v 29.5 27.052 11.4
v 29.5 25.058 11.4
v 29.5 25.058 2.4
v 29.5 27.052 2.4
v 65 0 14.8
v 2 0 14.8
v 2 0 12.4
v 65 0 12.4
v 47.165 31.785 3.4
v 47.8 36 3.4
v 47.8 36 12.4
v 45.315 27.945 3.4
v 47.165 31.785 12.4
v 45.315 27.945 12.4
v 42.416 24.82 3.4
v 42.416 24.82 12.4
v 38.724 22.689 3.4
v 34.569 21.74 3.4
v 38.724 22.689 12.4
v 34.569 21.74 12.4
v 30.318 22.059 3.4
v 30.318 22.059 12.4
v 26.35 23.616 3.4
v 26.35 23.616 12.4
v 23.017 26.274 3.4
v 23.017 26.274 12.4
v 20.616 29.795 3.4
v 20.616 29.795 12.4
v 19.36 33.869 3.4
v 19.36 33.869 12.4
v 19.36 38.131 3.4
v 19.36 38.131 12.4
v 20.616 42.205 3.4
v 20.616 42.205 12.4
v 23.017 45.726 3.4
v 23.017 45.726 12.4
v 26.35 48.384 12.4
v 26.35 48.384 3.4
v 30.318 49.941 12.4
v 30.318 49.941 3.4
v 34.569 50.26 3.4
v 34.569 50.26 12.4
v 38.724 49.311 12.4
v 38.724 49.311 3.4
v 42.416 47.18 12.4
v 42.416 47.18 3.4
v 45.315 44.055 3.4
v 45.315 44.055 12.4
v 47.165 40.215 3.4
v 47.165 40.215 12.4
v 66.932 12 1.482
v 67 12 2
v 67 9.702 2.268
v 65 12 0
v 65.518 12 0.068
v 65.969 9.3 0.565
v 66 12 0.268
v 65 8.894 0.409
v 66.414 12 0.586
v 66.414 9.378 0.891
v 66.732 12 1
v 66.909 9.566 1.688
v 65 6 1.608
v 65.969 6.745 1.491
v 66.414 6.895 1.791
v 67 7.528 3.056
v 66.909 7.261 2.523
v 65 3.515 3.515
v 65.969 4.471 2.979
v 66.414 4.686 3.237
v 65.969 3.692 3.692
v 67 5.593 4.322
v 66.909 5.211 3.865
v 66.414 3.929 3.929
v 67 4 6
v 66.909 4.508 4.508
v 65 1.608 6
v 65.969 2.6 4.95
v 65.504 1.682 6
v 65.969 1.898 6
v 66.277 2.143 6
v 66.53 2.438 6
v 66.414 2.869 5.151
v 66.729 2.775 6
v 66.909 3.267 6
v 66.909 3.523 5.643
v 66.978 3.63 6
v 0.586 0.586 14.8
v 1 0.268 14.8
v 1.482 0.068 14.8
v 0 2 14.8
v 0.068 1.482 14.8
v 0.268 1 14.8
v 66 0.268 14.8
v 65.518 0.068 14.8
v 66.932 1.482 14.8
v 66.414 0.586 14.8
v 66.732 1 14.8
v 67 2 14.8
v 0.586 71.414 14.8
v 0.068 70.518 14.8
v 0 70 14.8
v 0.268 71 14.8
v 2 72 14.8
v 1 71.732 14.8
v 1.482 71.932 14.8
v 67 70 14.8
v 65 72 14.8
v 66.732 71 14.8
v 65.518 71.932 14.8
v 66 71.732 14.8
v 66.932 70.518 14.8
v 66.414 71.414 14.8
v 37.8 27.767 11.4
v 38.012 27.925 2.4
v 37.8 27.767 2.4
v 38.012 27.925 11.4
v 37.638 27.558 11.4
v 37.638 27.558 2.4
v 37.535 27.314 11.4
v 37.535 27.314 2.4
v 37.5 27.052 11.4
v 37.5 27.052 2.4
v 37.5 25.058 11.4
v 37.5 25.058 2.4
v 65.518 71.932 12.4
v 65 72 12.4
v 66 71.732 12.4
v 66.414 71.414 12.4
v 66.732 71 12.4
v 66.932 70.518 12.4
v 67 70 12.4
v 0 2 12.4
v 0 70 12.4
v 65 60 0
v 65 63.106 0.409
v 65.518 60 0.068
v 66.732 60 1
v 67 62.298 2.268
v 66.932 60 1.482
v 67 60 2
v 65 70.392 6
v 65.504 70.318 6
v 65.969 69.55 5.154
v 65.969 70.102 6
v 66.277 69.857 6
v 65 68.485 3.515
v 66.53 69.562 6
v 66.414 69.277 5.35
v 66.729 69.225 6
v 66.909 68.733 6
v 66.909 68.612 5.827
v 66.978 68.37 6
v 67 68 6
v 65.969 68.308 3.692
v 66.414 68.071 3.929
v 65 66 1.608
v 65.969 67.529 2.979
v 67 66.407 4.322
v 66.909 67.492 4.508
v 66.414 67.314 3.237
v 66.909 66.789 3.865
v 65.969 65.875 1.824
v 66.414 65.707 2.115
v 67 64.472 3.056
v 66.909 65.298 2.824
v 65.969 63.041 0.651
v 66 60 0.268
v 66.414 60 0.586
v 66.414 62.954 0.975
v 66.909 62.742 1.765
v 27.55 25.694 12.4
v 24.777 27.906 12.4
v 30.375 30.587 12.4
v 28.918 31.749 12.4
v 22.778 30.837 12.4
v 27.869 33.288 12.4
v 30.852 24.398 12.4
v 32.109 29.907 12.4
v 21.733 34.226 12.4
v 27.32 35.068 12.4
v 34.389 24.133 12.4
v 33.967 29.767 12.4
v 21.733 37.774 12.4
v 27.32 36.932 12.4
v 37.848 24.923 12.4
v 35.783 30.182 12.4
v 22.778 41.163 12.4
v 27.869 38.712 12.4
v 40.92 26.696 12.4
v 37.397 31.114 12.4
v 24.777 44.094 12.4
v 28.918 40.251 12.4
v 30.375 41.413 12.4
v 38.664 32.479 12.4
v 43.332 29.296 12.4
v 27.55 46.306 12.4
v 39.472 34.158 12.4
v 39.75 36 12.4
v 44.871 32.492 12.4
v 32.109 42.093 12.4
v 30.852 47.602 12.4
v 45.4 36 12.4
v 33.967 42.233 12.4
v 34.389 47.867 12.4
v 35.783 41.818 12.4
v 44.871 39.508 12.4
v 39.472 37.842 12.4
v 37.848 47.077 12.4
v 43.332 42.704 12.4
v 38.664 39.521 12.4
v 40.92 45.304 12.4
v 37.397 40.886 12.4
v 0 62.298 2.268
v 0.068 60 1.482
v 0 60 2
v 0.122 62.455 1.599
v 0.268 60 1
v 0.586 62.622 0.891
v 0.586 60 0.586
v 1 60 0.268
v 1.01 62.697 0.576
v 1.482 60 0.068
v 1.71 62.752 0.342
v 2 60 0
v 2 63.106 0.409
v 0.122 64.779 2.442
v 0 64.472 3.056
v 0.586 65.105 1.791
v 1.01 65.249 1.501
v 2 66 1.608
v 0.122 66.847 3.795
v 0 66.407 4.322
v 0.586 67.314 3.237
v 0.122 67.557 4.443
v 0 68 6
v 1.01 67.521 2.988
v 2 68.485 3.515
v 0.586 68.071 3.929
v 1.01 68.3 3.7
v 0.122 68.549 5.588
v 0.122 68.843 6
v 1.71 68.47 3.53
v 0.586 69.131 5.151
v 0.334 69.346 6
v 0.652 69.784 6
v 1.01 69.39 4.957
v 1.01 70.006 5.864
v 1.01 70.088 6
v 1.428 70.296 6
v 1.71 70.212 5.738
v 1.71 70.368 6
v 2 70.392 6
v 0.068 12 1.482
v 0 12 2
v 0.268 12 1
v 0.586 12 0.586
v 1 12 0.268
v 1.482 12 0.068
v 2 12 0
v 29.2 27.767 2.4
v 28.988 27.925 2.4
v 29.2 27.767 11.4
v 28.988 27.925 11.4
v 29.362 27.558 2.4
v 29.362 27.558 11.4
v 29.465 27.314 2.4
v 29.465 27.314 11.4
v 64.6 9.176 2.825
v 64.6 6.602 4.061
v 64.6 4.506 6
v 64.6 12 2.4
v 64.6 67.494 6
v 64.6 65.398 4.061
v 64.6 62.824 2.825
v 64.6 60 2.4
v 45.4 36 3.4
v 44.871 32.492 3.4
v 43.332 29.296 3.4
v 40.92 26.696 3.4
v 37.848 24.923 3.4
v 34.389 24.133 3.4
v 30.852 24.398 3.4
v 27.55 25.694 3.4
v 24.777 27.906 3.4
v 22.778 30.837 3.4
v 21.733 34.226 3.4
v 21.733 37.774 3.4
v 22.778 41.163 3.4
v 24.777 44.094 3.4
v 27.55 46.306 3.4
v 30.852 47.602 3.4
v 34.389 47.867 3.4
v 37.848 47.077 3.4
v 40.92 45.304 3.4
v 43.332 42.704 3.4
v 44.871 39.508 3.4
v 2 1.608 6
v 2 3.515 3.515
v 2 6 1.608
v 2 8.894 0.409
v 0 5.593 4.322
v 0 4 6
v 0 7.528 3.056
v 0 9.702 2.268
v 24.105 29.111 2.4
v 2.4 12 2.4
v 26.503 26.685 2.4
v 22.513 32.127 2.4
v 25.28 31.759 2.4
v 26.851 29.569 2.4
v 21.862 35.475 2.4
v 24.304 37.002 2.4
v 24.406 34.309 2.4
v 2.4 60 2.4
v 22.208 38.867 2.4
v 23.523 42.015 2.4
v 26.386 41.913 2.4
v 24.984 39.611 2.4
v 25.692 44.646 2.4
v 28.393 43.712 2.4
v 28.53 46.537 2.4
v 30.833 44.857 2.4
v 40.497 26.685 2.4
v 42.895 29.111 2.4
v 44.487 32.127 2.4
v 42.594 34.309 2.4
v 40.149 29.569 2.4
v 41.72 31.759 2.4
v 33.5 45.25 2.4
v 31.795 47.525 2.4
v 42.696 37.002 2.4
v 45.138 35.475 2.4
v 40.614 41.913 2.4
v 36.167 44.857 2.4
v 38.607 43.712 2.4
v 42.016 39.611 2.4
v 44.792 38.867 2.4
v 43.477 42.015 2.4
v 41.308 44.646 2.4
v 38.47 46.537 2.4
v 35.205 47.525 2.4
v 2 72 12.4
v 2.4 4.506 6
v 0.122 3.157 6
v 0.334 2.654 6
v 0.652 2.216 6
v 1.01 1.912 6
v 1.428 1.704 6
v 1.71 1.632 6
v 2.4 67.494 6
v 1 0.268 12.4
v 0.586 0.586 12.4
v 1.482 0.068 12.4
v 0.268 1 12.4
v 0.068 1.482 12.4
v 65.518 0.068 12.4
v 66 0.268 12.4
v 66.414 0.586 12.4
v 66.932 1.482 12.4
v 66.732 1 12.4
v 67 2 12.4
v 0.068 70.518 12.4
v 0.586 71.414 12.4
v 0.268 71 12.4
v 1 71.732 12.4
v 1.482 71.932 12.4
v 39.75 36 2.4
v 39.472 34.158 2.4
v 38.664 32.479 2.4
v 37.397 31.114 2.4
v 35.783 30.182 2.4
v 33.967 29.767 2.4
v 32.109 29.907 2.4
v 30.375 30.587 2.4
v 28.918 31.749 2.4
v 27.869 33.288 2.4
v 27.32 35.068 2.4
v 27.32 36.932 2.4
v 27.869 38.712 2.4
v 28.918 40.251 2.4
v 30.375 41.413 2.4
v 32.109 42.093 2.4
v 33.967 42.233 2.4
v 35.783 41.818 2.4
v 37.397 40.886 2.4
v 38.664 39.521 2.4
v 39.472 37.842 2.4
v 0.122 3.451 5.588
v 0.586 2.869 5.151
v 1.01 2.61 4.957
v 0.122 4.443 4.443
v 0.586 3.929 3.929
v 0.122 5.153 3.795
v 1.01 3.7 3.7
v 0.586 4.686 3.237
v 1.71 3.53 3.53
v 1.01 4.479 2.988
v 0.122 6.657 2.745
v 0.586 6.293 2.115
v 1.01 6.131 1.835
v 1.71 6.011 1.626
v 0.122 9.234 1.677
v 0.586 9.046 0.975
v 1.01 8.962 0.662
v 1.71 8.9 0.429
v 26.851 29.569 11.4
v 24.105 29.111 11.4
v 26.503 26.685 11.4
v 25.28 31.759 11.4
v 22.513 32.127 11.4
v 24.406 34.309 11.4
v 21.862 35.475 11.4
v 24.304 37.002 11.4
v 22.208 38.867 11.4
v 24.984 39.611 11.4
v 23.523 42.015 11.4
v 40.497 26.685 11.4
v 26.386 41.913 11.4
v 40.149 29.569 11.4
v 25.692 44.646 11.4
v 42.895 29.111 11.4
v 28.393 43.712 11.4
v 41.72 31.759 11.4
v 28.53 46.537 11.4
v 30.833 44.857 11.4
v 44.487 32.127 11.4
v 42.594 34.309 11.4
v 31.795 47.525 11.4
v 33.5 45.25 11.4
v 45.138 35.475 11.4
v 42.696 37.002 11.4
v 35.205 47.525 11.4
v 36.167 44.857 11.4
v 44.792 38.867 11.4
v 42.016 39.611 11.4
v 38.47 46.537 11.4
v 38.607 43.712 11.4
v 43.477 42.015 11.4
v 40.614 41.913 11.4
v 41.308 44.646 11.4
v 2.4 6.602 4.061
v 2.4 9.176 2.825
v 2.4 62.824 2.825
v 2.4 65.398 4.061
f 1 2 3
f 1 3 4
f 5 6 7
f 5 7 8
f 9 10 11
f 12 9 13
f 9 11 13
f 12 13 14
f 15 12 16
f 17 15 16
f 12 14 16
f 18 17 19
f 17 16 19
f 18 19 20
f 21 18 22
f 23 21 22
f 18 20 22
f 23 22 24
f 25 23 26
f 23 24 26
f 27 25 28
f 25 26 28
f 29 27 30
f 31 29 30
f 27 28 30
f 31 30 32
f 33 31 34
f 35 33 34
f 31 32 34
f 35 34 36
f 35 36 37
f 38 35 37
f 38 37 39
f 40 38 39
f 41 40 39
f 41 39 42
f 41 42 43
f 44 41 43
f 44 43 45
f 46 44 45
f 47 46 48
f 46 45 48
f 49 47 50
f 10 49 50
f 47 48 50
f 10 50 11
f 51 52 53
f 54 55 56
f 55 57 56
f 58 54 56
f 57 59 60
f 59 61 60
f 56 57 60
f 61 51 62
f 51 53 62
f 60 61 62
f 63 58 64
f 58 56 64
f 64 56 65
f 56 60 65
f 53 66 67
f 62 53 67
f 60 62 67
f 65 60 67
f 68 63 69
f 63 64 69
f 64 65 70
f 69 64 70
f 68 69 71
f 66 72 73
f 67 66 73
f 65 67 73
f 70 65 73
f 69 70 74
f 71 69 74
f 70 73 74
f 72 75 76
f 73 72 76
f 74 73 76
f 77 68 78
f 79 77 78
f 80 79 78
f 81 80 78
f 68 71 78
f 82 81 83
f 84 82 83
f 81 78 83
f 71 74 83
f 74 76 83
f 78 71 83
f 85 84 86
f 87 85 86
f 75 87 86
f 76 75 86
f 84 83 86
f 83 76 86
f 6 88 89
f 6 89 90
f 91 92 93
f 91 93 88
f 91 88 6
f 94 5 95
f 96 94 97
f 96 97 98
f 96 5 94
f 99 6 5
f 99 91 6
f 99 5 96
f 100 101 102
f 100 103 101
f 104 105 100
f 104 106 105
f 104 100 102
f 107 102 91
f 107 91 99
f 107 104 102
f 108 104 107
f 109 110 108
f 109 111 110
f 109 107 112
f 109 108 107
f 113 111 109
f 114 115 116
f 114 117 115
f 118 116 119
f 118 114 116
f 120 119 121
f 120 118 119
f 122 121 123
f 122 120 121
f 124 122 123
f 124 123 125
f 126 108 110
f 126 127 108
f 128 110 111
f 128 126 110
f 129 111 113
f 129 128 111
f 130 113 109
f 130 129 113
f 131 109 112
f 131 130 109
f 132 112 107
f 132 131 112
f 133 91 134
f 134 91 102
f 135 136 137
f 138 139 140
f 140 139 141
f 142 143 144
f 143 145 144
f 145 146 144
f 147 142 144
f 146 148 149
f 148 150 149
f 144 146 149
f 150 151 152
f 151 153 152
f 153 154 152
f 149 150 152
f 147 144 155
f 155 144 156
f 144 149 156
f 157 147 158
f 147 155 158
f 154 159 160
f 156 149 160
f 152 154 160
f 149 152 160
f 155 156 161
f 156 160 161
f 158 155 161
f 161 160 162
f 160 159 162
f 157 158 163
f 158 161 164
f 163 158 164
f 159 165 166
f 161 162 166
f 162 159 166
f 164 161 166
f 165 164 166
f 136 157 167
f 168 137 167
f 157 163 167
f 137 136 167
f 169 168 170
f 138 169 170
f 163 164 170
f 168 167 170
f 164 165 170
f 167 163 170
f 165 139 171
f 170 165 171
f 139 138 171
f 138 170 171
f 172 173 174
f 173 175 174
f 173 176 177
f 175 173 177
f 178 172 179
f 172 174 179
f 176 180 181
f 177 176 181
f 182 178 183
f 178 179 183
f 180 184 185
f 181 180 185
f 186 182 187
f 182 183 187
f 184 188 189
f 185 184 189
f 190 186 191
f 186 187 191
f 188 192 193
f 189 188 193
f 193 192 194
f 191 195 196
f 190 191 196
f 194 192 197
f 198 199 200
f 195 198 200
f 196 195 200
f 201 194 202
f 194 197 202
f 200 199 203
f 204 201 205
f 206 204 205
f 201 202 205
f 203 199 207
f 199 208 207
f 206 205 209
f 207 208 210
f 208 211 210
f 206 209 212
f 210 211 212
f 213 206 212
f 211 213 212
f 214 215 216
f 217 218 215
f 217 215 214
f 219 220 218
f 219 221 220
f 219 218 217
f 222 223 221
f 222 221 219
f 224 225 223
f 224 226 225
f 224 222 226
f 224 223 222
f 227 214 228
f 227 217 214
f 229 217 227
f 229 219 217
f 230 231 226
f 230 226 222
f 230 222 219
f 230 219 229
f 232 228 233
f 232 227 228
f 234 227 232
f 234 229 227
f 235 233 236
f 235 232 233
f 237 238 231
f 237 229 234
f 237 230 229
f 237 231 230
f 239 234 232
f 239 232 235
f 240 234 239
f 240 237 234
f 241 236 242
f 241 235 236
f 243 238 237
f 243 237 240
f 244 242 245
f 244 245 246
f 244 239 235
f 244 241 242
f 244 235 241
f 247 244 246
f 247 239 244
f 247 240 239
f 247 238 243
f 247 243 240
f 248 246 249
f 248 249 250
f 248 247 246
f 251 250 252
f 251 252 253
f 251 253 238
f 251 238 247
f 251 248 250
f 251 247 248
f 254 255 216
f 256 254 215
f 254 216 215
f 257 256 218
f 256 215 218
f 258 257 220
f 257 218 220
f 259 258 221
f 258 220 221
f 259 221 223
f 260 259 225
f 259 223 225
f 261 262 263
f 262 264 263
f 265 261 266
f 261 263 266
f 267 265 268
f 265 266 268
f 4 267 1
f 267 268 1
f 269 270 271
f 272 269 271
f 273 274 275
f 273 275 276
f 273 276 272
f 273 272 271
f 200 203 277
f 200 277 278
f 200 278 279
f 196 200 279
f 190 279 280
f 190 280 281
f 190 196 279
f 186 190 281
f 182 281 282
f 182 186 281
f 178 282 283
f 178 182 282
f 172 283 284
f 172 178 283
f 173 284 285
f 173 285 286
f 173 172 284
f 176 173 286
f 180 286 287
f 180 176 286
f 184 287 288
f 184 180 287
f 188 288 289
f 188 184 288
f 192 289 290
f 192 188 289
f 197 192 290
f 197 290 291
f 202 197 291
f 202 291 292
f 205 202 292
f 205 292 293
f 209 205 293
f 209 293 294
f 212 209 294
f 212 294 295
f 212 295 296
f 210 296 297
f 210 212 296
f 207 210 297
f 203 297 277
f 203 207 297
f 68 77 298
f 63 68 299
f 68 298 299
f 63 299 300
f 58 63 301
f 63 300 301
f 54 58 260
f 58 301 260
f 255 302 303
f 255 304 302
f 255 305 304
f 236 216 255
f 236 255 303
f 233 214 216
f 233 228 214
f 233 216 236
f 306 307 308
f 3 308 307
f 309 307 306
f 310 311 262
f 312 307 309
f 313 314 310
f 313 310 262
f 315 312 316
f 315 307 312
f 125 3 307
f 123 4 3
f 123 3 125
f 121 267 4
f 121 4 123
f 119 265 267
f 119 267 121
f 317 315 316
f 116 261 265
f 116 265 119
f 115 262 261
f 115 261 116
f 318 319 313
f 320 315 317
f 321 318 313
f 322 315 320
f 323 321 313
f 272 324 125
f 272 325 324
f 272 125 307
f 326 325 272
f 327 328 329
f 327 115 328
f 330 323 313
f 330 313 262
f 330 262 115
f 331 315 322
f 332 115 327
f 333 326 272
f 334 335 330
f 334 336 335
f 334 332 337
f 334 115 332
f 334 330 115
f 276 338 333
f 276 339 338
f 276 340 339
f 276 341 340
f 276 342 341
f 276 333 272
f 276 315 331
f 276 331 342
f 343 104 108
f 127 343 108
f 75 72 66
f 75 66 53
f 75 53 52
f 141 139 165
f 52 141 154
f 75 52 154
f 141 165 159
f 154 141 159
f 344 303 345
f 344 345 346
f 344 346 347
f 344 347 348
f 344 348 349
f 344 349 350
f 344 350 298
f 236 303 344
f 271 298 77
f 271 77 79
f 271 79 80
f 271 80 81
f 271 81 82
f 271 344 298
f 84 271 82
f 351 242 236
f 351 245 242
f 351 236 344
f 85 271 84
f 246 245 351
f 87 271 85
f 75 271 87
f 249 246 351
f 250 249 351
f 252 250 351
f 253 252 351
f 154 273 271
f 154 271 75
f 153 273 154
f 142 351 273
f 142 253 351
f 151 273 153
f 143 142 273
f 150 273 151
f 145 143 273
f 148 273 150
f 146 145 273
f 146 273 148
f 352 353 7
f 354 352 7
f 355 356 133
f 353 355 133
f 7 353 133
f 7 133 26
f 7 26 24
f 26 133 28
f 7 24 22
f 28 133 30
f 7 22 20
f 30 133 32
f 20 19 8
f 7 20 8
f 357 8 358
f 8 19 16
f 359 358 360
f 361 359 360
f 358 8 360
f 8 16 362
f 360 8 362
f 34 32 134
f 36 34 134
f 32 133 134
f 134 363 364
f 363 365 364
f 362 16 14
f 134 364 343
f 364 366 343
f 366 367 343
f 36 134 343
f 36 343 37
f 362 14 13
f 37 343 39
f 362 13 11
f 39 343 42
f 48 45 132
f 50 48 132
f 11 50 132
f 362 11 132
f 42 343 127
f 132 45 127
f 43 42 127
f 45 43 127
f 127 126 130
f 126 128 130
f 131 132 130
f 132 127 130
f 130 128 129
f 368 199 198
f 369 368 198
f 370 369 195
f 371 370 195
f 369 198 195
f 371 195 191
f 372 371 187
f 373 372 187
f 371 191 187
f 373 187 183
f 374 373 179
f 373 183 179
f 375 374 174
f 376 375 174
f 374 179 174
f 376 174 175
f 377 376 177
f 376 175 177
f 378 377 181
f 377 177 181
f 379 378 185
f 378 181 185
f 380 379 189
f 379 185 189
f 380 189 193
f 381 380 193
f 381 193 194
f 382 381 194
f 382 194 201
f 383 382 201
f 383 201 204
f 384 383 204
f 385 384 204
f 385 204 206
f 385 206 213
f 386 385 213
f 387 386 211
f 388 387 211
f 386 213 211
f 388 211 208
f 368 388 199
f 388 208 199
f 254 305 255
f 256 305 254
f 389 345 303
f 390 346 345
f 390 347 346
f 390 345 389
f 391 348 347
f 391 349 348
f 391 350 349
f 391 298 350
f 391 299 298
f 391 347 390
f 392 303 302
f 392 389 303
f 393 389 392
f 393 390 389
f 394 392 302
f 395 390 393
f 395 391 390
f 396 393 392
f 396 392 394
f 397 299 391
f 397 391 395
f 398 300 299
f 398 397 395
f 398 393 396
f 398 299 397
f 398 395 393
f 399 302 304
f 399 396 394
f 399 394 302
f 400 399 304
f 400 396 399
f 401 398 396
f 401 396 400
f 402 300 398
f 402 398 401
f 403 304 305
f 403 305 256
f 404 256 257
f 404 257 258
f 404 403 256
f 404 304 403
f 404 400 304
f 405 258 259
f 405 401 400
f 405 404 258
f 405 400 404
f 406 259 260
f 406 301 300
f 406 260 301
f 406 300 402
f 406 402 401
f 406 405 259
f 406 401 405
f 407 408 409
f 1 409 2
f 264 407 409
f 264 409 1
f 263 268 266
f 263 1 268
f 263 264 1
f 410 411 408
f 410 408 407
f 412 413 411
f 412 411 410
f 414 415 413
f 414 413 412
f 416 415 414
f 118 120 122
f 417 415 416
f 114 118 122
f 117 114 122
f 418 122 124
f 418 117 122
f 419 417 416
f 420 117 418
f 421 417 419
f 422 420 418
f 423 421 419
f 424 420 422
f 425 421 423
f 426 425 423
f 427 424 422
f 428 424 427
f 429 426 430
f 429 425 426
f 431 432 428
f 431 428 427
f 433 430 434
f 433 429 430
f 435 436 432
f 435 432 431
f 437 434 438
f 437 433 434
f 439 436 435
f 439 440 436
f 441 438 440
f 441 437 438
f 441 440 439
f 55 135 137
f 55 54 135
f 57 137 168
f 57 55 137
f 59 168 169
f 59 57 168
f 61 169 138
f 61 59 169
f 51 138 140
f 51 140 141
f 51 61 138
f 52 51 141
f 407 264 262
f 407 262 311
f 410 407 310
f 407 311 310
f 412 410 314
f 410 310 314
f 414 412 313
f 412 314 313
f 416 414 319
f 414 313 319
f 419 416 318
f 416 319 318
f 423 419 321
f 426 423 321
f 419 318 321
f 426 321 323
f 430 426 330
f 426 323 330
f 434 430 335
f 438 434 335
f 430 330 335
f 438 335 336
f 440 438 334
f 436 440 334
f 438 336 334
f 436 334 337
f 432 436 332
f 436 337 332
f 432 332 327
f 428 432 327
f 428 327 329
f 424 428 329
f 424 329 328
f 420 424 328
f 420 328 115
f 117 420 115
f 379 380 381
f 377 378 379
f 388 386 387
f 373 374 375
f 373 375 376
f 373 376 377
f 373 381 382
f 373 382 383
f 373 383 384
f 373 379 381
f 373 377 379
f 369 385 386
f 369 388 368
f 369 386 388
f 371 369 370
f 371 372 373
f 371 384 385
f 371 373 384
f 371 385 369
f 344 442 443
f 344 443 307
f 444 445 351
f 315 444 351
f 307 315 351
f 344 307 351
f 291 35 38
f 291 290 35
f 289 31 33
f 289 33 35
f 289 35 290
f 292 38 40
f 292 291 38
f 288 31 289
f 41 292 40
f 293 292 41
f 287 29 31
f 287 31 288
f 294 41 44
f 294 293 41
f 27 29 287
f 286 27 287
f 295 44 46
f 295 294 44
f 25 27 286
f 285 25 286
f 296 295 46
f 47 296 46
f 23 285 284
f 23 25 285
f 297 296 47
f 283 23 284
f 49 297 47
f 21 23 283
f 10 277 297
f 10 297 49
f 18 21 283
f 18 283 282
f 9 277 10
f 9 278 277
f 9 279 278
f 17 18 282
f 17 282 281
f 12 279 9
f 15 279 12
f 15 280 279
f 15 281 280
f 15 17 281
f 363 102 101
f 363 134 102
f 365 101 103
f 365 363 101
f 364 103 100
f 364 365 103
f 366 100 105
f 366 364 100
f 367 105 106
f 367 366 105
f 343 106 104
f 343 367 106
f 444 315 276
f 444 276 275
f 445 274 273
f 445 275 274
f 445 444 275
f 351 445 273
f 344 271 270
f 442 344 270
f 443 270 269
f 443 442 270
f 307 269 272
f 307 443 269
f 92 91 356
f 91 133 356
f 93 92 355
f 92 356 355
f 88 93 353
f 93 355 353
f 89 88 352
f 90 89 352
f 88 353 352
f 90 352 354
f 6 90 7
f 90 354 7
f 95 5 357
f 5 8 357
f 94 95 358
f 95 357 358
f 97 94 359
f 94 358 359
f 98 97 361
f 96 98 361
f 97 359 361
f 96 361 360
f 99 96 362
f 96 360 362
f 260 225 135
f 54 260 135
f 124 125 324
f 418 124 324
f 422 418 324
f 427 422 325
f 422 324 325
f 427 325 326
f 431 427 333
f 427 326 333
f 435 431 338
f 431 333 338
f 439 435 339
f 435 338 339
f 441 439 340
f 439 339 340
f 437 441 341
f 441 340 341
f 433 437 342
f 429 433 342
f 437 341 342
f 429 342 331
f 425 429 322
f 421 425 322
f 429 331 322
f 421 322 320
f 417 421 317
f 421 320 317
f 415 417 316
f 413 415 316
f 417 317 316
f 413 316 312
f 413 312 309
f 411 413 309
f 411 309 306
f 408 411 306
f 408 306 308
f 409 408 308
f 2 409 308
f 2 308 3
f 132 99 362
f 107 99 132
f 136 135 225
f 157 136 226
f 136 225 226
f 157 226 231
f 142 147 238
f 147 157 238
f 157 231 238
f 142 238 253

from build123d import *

# Parameters (mm, degrees)
F0_W      = 67
F0_H      = 72
F1_DEPTH  = 6
F3_DEPTH  = 67.001
F4_R      = 2
F5_T      = -2.4
F7_DEPTH  = 9
F8_R      = 1
F10_W     = 67
F10_H     = 72
F11_DEPTH = 2.4
F12_R     = 6.25
F13_DEPTH = 10
F12_R_2   = 14.3
F12_R_3   = 11.9
F14_DEPTH = 9
F15_R     = 2


with BuildPart() as f1:
    # F0 (on Top) → F1 (new body)
    with BuildSketch(Plane.XY):
        with Locations((33.5, 36)):
            Rectangle(F0_W, F0_H)
    extrude(amount=F1_DEPTH)

    # F2 (on face) → F3 (cut, through all)
    with BuildSketch(Plane(origin=(0, 0, 0), x_dir=(0, -1, 0), z_dir=(-1, 0, 0))):
        with BuildLine():
            Line((-70.3923048454, 6), (-72, 6))
            Line((-72, 6), (-72, 0))
            Line((-72, 0), (-60, 0))
            ThreePointArc((-60, 0), (-66, 1.6076951546), (-70.3923048454, 6))
        make_face()
        with BuildLine():
            Line((0, 6), (-1.6076951546, 6))
            ThreePointArc((-1.6076951546, 6), (-6, 1.6076951546), (-12, 0))
            Line((-12, 0), (0, 0))
            Line((0, 0), (0, 6))
        make_face()
    extrude(amount=-F3_DEPTH, mode=Mode.SUBTRACT)

    # F4
    f4_edges = [f1.edges().sort_by_distance(p)[0] for p in [
        (0, 6, 1.607695),
        (67, 6, 1.607695),
    ]]
    fillet(f4_edges, radius=F4_R)

    # F5
    f5_openings = [f1.faces().sort_by_distance(p)[0] for p in [
        (33.5, 36, 6),
    ]]
    offset(amount=F5_T, openings=f5_openings)

    # F6 (on face) → F7 (join)
    with BuildSketch(Plane.XY.offset(2.4)):
        with BuildLine():
            ThreePointArc((29.5, 27.6595863412), (33.5, 45.25), (37.5, 27.6595863412))
            Line((37.5, 27.6595863412), (37.5, 25.0582222651))
            ThreePointArc((37.5, 25.0582222651), (33.5, 47.65), (29.5, 25.0582222651))
            Line((29.5, 25.0582222651), (29.5, 27.6595863412))
        make_face()
    extrude(amount=F7_DEPTH)

    # F8
    f8_edges = [f1.edges().sort_by_distance(p)[0] for p in [
        (29.5, 27.659586, 6.9),
        (37.5, 27.659586, 6.9),
    ]]
    fillet(f8_edges, radius=F8_R)


with BuildPart() as f11:
    # F10 (on offset) → F11 (new body)
    with BuildSketch(Plane.XY.offset(14.8)):
        with Locations((33.5, 36)):
            Rectangle(F10_W, F10_H)
    extrude(amount=-F11_DEPTH)

    # F12 (on face) → F13 (join)
    with BuildSketch(Plane(origin=(0, 0, 12.4), x_dir=(1, 0, 0), z_dir=(0, 0, -1))):
        with Locations((33.5, -36)):
            Circle(F12_R)
    extrude(amount=F13_DEPTH)

    # F12 (on face) → F14 (join)
    with BuildSketch(Plane(origin=(0, 0, 12.4), x_dir=(1, 0, 0), z_dir=(0, 0, -1))):
        with Locations((33.5, -36)):
            Circle(F12_R_2)
        with Locations((33.5, -36)):
            Circle(F12_R_3, mode=Mode.SUBTRACT)
    extrude(amount=F14_DEPTH)

    # F15
    f15_edges = [f11.edges().sort_by_distance(p)[0] for p in [
        (67, 0, 13.6),
        (0, 0, 13.6),
        (0, 72, 13.6),
        (67, 72, 13.6),
    ]]
    fillet(f15_edges, radius=F15_R)


solid = Compound([f1.part, f11.part])
